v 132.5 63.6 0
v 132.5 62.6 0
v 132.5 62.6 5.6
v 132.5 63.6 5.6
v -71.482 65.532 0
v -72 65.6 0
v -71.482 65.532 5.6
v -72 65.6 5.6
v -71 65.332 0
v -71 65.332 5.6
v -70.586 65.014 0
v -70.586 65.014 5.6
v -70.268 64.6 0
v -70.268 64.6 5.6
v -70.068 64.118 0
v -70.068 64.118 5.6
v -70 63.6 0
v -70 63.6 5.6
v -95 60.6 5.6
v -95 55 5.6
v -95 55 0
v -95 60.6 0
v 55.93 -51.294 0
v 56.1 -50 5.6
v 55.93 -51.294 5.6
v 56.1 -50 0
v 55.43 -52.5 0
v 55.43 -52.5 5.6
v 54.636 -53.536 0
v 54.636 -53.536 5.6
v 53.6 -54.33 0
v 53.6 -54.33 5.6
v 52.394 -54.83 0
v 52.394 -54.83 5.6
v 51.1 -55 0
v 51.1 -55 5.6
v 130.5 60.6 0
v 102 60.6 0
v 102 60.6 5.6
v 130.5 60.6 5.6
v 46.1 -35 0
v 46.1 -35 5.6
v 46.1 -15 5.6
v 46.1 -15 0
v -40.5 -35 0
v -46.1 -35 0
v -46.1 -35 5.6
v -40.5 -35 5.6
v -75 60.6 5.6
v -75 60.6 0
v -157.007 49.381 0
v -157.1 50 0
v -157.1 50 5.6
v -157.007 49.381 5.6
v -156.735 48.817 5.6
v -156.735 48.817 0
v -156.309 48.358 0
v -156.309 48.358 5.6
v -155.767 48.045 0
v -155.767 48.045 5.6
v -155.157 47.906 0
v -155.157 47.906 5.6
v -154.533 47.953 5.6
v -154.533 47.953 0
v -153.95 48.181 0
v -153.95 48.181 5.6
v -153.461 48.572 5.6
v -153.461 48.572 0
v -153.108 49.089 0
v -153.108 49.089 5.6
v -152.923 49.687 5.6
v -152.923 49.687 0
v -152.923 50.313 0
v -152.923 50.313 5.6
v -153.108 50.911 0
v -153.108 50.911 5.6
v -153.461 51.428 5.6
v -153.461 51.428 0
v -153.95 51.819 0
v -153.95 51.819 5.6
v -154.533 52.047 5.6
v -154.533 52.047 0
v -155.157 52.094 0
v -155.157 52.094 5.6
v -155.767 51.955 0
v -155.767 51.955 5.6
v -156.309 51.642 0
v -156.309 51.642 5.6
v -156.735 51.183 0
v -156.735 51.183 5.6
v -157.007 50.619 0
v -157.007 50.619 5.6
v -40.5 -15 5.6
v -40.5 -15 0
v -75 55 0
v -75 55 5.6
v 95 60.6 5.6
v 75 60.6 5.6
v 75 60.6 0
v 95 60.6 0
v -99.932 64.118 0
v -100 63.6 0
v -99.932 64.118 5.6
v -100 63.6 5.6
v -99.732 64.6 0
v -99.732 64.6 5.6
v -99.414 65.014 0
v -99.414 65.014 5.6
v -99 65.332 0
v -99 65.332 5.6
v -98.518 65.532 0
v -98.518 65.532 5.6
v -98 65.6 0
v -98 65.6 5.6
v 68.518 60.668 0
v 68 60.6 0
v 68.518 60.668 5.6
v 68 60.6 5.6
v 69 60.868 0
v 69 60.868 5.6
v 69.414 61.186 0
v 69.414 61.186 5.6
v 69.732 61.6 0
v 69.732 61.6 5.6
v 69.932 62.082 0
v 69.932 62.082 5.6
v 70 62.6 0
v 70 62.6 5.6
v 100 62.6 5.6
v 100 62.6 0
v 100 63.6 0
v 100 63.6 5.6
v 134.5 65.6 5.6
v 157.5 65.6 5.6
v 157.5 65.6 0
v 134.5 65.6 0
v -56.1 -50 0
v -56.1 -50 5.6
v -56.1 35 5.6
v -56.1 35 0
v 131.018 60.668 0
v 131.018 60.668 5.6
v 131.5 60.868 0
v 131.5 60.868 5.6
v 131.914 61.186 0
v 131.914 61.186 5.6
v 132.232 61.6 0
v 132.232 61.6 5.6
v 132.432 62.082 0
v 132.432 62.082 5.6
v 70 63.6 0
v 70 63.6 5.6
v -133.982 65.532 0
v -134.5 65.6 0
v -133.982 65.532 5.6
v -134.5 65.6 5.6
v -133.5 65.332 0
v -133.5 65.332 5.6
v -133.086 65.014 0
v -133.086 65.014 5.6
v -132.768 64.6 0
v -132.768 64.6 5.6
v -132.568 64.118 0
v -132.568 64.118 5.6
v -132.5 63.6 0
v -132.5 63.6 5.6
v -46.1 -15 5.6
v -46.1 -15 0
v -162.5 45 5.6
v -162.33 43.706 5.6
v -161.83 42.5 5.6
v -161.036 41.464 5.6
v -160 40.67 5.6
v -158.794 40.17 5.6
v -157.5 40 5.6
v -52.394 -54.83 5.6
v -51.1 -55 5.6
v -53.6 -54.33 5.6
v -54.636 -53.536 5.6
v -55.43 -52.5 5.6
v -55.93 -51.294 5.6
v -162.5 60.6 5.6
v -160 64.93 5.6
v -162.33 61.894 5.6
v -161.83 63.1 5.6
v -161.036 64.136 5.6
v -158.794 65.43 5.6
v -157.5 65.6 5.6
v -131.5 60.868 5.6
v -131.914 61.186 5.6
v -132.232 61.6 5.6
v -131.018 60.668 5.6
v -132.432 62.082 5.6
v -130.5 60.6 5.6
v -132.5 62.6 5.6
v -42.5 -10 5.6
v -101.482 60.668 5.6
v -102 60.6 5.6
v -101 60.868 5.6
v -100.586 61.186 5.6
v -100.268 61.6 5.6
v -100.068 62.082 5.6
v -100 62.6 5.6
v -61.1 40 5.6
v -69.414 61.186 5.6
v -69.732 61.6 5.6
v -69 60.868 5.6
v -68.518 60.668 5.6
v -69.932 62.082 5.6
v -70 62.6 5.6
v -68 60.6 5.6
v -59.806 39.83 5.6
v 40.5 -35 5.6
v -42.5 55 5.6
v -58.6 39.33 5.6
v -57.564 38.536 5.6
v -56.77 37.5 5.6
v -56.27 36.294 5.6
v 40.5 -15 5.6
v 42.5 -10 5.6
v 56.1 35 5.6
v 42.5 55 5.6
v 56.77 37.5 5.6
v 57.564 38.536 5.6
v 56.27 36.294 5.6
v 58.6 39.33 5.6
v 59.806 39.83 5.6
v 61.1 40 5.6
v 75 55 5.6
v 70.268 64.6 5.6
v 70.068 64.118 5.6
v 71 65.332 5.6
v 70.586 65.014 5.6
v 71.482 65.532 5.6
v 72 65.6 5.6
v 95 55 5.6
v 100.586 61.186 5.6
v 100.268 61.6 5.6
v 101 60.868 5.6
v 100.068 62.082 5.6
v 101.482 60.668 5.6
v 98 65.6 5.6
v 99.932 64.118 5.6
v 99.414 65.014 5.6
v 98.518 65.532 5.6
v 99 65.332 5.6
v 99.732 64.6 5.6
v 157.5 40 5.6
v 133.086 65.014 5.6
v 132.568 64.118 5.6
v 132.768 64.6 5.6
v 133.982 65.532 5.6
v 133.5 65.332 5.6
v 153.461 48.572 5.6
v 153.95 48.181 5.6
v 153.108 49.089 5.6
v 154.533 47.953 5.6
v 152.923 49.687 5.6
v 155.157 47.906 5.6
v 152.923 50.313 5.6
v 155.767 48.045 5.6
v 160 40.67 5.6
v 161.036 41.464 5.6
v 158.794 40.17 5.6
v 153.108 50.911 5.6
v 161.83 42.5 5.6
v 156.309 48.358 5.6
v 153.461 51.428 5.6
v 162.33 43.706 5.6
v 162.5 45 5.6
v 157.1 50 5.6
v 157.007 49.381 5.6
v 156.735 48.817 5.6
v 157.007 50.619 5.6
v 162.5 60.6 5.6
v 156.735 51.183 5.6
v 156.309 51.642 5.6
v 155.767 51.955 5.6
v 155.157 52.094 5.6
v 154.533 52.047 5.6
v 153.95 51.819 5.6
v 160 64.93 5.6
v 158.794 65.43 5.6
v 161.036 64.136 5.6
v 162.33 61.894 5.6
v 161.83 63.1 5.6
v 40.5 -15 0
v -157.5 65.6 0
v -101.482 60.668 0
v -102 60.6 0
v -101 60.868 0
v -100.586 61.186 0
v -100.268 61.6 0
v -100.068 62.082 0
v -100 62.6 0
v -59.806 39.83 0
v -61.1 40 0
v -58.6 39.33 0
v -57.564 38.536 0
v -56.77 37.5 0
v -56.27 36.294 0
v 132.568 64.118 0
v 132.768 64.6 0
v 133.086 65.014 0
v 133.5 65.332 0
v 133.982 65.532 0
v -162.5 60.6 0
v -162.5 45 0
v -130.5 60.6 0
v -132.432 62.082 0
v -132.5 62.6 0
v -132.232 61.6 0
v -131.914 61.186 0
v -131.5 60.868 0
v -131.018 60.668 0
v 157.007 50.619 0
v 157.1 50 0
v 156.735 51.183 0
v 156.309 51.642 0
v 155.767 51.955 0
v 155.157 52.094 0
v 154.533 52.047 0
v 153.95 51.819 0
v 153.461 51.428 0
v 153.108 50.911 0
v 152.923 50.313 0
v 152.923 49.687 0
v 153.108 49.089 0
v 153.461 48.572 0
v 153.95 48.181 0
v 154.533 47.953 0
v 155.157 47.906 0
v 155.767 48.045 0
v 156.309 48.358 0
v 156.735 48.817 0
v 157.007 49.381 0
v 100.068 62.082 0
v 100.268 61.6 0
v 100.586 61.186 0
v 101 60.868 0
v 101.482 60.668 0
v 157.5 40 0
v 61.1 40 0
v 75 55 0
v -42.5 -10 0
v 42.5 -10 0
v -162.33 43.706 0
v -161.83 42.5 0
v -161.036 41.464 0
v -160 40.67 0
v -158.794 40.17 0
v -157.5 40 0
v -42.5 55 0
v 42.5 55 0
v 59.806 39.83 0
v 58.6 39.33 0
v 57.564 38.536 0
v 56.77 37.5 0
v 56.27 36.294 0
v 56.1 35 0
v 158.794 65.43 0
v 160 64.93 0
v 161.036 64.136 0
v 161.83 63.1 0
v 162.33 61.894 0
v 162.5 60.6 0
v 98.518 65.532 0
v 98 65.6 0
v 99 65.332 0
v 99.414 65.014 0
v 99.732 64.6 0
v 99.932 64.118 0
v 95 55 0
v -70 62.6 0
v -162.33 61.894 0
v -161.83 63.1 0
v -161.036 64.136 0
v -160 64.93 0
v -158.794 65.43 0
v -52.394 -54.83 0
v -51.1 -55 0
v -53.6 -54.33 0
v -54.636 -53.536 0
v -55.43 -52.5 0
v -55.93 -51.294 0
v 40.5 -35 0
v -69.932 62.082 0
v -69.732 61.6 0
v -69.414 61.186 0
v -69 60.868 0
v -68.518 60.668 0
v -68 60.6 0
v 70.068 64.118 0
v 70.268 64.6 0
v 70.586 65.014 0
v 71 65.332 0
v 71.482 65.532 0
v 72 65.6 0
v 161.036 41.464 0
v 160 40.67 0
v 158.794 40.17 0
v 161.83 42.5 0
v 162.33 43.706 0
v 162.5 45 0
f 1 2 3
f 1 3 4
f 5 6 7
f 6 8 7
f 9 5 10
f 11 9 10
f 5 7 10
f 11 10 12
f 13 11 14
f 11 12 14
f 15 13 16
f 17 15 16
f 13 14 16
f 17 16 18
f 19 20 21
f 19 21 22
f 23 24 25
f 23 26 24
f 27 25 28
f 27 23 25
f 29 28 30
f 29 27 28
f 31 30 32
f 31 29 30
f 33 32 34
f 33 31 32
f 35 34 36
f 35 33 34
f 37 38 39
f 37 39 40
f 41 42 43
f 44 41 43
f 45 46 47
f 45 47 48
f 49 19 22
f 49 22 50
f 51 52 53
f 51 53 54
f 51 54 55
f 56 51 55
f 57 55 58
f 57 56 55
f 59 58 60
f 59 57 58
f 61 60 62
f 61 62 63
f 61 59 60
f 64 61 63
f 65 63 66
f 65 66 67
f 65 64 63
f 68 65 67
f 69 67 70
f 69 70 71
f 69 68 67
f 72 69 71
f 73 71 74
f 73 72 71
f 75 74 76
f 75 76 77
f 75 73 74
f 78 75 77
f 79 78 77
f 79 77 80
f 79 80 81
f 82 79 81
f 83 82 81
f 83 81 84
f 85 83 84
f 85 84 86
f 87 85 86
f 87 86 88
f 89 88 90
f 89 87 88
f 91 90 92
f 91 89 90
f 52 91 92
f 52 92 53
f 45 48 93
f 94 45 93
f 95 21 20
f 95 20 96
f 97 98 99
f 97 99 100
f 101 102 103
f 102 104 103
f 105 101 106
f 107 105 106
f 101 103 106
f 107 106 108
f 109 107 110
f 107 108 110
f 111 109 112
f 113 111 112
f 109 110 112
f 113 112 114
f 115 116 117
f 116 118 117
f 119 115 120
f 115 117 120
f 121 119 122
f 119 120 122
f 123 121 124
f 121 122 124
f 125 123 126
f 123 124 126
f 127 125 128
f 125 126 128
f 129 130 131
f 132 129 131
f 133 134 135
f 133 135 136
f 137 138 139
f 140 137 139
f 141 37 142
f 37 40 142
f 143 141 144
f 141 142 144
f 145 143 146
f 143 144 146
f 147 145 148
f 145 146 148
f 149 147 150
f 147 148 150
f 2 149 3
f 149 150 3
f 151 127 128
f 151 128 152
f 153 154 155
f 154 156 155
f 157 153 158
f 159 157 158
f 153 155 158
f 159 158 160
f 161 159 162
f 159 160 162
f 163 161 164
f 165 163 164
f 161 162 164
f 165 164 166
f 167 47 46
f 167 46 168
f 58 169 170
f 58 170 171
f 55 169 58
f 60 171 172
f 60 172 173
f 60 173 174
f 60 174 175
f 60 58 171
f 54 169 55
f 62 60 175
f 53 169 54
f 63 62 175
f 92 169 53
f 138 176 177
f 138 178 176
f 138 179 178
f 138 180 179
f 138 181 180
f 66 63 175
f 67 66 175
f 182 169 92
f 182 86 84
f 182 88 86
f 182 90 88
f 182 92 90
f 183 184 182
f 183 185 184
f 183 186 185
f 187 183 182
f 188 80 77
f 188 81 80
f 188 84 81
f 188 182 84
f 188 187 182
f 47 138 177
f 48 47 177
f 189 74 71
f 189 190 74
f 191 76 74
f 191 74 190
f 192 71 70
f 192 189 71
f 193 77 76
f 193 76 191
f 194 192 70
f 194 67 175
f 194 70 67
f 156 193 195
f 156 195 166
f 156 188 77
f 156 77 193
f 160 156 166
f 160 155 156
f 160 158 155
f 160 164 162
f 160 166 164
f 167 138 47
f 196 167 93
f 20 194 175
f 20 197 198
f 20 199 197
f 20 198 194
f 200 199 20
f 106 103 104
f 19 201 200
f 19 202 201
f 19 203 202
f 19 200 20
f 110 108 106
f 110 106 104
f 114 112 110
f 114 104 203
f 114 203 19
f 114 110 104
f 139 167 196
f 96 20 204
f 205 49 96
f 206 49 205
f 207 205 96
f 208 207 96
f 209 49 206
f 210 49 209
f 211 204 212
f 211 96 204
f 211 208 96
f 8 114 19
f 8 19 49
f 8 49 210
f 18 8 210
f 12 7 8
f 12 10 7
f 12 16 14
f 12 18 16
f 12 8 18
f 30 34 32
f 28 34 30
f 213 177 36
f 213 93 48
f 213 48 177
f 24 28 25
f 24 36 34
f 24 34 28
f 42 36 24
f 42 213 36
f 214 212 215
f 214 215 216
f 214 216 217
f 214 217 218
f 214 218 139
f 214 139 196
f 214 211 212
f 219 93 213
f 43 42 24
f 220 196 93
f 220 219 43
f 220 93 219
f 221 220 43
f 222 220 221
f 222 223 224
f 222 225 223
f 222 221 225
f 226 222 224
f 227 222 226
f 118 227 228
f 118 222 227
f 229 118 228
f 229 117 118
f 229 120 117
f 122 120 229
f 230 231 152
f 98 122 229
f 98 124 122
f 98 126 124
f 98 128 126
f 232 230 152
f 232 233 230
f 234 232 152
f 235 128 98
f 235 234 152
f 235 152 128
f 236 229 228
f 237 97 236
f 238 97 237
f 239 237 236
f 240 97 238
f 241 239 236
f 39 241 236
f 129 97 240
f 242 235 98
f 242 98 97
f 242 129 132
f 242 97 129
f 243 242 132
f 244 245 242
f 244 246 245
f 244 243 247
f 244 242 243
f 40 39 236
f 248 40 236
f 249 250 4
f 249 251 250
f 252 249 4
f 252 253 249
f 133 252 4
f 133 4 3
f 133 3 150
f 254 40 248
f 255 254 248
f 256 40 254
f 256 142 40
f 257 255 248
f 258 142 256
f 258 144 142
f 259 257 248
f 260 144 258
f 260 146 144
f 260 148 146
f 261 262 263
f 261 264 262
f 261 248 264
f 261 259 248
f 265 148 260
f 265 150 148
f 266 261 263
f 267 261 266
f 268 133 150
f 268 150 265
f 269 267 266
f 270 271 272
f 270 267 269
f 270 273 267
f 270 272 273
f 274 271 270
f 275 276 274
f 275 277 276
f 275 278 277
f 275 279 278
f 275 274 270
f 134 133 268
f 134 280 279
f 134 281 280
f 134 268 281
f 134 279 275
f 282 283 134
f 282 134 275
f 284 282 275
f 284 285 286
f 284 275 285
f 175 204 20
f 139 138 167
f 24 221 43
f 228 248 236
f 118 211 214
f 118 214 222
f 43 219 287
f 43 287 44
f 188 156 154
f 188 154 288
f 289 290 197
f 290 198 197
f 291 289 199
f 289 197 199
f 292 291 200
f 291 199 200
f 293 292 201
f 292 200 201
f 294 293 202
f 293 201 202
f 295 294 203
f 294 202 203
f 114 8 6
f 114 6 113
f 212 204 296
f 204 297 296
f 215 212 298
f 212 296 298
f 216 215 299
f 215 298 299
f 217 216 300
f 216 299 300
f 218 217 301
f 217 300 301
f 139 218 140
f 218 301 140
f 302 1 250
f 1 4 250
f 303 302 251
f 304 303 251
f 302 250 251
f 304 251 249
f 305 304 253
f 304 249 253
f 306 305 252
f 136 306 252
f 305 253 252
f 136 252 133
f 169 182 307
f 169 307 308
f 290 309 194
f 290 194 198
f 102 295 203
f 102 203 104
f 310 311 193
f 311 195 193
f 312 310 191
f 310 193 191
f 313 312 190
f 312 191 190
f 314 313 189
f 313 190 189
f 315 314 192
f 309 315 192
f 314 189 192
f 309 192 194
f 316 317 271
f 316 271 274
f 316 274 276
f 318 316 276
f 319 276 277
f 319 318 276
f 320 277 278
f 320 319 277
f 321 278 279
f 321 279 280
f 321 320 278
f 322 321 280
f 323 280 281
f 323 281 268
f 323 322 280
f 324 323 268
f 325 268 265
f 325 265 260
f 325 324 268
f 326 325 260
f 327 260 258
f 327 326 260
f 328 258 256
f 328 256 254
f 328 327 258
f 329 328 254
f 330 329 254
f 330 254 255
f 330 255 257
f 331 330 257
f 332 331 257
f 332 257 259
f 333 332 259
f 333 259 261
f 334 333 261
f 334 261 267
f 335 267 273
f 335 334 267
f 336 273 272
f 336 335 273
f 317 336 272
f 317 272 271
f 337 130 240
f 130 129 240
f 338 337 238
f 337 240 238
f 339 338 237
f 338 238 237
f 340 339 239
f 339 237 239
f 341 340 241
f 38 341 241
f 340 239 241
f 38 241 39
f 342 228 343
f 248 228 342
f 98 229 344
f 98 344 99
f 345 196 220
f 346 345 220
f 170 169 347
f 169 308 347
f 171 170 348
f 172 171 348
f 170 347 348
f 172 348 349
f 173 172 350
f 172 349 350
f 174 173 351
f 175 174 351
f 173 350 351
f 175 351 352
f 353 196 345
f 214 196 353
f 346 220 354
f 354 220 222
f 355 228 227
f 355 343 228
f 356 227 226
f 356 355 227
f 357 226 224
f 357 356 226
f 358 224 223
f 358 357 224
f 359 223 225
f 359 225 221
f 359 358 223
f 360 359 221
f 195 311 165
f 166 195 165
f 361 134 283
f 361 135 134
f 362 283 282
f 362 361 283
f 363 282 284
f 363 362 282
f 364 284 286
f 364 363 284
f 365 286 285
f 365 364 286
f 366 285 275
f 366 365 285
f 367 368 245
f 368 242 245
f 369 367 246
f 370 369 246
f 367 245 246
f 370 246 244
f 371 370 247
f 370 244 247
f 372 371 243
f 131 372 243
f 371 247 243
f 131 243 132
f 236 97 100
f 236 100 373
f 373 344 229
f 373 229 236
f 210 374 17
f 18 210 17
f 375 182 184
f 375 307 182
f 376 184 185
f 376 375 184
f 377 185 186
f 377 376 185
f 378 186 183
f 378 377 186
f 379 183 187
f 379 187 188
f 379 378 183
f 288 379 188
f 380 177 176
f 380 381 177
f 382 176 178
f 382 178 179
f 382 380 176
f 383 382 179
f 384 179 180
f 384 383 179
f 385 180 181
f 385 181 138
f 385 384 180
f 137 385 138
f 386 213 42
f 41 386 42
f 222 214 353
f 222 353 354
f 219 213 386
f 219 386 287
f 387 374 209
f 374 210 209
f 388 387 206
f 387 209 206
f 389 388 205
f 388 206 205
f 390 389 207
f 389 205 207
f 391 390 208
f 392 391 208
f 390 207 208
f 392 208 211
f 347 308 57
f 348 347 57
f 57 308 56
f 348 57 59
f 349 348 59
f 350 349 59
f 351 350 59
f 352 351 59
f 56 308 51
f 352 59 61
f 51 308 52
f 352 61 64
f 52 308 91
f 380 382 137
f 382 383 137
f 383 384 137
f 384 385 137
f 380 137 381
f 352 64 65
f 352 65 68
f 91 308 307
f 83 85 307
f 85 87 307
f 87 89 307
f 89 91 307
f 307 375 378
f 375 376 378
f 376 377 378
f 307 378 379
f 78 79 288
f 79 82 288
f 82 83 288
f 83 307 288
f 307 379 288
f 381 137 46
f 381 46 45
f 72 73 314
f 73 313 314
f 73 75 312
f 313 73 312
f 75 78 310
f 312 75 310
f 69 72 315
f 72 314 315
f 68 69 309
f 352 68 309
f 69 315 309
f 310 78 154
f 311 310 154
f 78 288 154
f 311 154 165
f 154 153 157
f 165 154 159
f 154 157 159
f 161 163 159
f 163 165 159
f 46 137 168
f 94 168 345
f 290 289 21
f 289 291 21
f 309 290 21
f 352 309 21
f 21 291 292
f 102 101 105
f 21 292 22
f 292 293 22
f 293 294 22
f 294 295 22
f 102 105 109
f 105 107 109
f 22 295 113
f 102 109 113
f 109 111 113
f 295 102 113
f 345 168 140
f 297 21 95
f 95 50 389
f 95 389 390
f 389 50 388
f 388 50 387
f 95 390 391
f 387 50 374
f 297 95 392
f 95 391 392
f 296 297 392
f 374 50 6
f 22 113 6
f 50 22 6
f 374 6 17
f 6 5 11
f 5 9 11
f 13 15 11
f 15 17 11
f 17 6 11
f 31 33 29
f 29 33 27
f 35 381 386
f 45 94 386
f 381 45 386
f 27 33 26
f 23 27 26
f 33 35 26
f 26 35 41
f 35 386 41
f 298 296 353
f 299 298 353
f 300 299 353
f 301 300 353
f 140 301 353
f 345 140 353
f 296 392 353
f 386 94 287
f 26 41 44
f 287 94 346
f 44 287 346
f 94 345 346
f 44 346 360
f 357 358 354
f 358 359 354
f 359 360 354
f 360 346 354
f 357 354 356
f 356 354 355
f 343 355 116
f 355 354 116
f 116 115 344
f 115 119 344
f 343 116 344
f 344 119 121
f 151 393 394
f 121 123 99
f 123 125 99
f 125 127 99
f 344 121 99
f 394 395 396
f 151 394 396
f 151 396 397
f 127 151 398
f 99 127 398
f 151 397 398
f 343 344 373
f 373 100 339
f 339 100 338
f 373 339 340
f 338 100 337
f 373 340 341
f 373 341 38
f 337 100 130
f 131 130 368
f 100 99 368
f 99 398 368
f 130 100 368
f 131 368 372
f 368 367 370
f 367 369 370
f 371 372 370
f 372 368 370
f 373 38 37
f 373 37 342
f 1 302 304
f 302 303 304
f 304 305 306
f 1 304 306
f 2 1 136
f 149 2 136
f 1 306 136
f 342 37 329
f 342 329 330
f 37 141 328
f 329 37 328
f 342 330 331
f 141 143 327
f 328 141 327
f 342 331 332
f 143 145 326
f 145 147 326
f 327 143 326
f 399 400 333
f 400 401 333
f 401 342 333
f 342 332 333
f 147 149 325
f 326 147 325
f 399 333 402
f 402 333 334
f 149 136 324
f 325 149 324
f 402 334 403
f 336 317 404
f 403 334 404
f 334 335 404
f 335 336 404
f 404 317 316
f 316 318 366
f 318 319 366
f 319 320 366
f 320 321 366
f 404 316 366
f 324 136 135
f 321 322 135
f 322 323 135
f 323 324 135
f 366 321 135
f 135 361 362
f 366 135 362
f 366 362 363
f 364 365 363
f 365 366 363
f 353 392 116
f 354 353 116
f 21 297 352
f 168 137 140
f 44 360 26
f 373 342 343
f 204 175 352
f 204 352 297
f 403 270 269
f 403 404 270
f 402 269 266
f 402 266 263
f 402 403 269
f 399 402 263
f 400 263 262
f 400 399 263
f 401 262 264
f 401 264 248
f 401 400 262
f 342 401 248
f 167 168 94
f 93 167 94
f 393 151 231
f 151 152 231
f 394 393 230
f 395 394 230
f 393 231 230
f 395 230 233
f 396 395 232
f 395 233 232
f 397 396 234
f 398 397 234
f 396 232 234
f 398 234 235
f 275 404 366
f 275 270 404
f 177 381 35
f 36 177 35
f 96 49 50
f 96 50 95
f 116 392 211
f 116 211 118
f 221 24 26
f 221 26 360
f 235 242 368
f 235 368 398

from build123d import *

# Parameters (mm, degrees)
SKETCH_1_W               = 325
SKETCH_1_H               = 110
SKETCH_1_R               = 2.1
EXTRUDE_1_DEPTH          = 5.6
EXTRUDE_2_DEPTH          = 5.6
SKETCH_2_W               = 85
SKETCH_2_H               = 65
SKETCH_2_W_2             = 5.6
SKETCH_2_H_2             = 20
SKETCH_2_W_3             = 20
SKETCH_2_H_3             = 5.6
CUT_EXTRUDE_1_DEPTH      = 176.331029769
SKETCH_4_W               = 106.4
SKETCH_4_H               = 95
SKETCH_4_R               = 2.1
CUT_EXTRUDE_2_DEPTH      = 176.331029769
CUT_EXTRUDE_3_DEPTH      = 176.331029769
CUT_EXTRUDE_3_DEPTH_BACK = 176.331029769
SKETCH_5_W               = 140
SKETCH_5_H               = 5
SKETCH_5_W_2             = 32.5
FILLET_1_R               = 5
FILLET_2_R               = 2


with BuildPart() as part:
    # ｽｹｯﾁ1 → ﾎﾞｽ - 押し出し1 (new body)
    with BuildSketch(Plane.XY):
        Rectangle(SKETCH_1_W, SKETCH_1_H)
        with Locations((155, 50)):
            Circle(SKETCH_1_R, mode=Mode.SUBTRACT)
        with Locations(Location((155, -50, 0), (0, 0, 180))):
            Circle(SKETCH_1_R, mode=Mode.SUBTRACT)
        with Locations(Location((-155, 50, 0), (0, 0, 180))):
            Circle(SKETCH_1_R, mode=Mode.SUBTRACT)
        with Locations((-155, -50)):
            Circle(SKETCH_1_R, mode=Mode.SUBTRACT)
    extrude(amount=EXTRUDE_1_DEPTH)

    # ｽｹｯﾁ3 → ﾎﾞｽ - 押し出し2 (add)
    with BuildSketch(Plane.XY.offset(5.6)):
        Polygon((-162.5, 65.6), (-162.5, 55), (-95, 55), (-95, 60.6), (-75, 60.6), (-75, 55), (0, 55), (0, 65.6), align=None)
        Polygon((162.5, 65.6), (0, 65.6), (0, 55), (75, 55), (75, 60.6), (95, 60.6), (95, 55), (162.5, 55), align=None)
    extrude(amount=-EXTRUDE_2_DEPTH)

    # ｽｹｯﾁ2 → ｶｯﾄ - 押し出し1 (cut, through all)
    with BuildSketch(Plane.XY.offset(5.6)):
        with Locations((0, 22.5)):
            Rectangle(SKETCH_2_W, SKETCH_2_H)
        with Locations((-43.3, -25)):
            Rectangle(SKETCH_2_W_2, SKETCH_2_H_2)
        with Locations((43.3, -25)):
            Rectangle(SKETCH_2_W_2, SKETCH_2_H_2)
        with Locations((85, 57.8)):
            Rectangle(SKETCH_2_W_3, SKETCH_2_H_3)
        with Locations((-85, 57.8)):
            Rectangle(SKETCH_2_W_3, SKETCH_2_H_3)
    extrude(amount=-CUT_EXTRUDE_1_DEPTH, mode=Mode.SUBTRACT)

    # ｽｹｯﾁ4 → ｶｯﾄ - 押し出し2 (cut, through all)
    # profile 1 of 2: a face of its own
    with BuildSketch(Plane.XY.offset(5.6)):
        with Locations((-109.3, -7.5)):
            Rectangle(SKETCH_4_W, SKETCH_4_H)
        with Locations((-155, -50)):
            Circle(SKETCH_4_R, mode=Mode.SUBTRACT)
    # profile 2 of 2: a face of its own
    with BuildSketch(Plane.XY.offset(5.6)):
        with Locations((109.3, -7.5)):
            Rectangle(SKETCH_4_W, SKETCH_4_H)
        with Locations((155, -50)):
            Circle(SKETCH_4_R, mode=Mode.SUBTRACT)
    extrude(amount=-CUT_EXTRUDE_2_DEPTH, mode=Mode.SUBTRACT)

    # ｽｹｯﾁ5 → ｶｯﾄ - 押し出し3 (cut, two sides: drawn at the far end of the back side and taken through both)
    with BuildSketch(Plane.XY.offset(5.6).offset(-CUT_EXTRUDE_3_DEPTH_BACK)):
        with Locations((0, 63.1)):
            Rectangle(SKETCH_5_W, SKETCH_5_H)
        with Locations((-116.25, 63.1)):
            Rectangle(SKETCH_5_W_2, SKETCH_5_H)
        with Locations((116.25, 63.1)):
            Rectangle(SKETCH_5_W_2, SKETCH_5_H)
    extrude(amount=CUT_EXTRUDE_3_DEPTH + CUT_EXTRUDE_3_DEPTH_BACK, mode=Mode.SUBTRACT)

    # ﾌｨﾚｯﾄ1
    fillet_1_edges = [part.edges().sort_by_distance(p)[0] for p in [
        (-56.1, -55, 2.8),
        (-162.5, 40, 2.8),
        (-56.1, 40, 2.8),
        (162.5, 40, 2.8),
        (56.1, -55, 2.8),
        (56.1, 40, 2.8),
        (-162.5, 65.6, 2.8),
        (162.5, 65.6, 2.8),
    ]]
    fillet(fillet_1_edges, radius=FILLET_1_R)

    # ﾌｨﾚｯﾄ2
    fillet_2_edges = [part.edges().sort_by_distance(p)[0] for p in [
        (100, 65.6, 2.8),
        (132.5, 65.6, 2.8),
        (132.5, 60.6, 2.8),
        (100, 60.6, 2.8),
        (-132.5, 60.6, 2.8),
        (-132.5, 65.6, 2.8),
        (-100, 65.6, 2.8),
        (-100, 60.6, 2.8),
        (70, 65.6, 2.8),
        (70, 60.6, 2.8),
        (-70, 60.6, 2.8),
        (-70, 65.6, 2.8),
    ]]
    fillet(fillet_2_edges, radius=FILLET_2_R)


solid = part.part
